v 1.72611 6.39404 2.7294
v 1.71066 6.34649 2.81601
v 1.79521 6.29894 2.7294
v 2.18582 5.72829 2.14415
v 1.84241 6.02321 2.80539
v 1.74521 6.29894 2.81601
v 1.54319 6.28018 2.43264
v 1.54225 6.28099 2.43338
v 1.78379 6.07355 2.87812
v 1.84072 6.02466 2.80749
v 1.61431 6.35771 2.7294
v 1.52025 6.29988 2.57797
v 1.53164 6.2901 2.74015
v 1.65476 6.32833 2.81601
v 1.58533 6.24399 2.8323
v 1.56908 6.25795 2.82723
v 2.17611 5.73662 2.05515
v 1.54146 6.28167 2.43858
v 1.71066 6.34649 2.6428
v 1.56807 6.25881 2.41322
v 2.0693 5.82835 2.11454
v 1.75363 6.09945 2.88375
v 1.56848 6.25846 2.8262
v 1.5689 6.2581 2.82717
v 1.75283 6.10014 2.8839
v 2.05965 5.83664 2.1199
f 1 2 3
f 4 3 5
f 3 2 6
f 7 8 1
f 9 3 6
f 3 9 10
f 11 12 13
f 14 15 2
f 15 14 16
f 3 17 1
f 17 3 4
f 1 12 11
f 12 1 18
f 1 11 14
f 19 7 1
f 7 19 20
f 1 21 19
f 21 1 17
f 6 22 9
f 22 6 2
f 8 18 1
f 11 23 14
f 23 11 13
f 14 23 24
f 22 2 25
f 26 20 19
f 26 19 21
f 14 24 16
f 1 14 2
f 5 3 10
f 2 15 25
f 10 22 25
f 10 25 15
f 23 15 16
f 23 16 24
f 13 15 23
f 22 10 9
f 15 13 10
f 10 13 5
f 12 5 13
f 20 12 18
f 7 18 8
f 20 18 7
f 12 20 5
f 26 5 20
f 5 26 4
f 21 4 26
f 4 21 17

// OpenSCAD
// Auto-generated OpenSCAD file

    inner_points = 10*[[0.7245880980657288, 0.12609962772758243, 1.0181341605432133e-13], [-0.6855635385041695, 0.018990515700464568, -1.0181341605432133e-13], [0.07306683579433854, -0.6325307465709257, 7.388094116376098e-14], [-0.03404227623277932, 0.7776208899989726, -7.388094116376098e-14], [0.019512279780886727, 0.07254507171395753, -0.7071067811865476]];

    outer_points = 10*[[0.6006779226054043, 0.0, -0.37307644430392006], [-0.6006779226054043, 0.0, 0.37307644430392006], [-0.33233807096506035, 0.3213003592020604, -0.5350864283121461], [0.33233807096506035, -0.3213003592020604, 0.5350864283121461], [0.169521207763744, 0.6298937046650228, 0.2729404347869597]];

    // Convex hull for inner set (I)
    module inner_hull() {
        hull() {
            for (p = inner_points) {
                translate(p) sphere(r=0.1);
            }
        }
    }

    // Convex hull for outer set (O) minus inner hull (O \ I)
    module outer_minus_inner() {
        difference() {
            hull() {
                for (p = outer_points) {
                    translate(p) sphere(r=0.1);
                }
            }
            inner_hull(); // Subtract inner hull
        }
    }

    // Convex hull for outer set (O) minus all translated inner hulls
    module outer_minus_AllTranslationInner() {
        difference() {
            hull() {
                for (p = outer_points) {
                    translate(p) sphere(r=0.1);
                }
            }
            hull() {
                translate([0,0,50]) inner_hull();
                translate([0,0,-50]) inner_hull();
            }; // Subtract translated inner hulls
        }
    }

    // Difference between outer_minus_inner and outer_minus_AllTranslationInner
    module outer_minus_inner_diff() {
        difference() {
            // Outer minus inner
            difference() {
                hull() {
                    for (p = outer_points) {
                        translate(p) sphere(r=0.1);
                    }
                }
                inner_hull();
            }

            // Subtract Outer minus AllTranslationInner
            difference() {
                hull() {
                    for (p = outer_points) {
                        translate(p) sphere(r=0.1);
                    }
                }
                hull() {
                    translate([0,0,50]) inner_hull();
                    translate([0,0,-50]) inner_hull();
                };
            }
        }
    }

    // Rendering all with colors applied
    color([0, 1, 0, 1]) outer_minus_AllTranslationInner(); // Opaque green
    
